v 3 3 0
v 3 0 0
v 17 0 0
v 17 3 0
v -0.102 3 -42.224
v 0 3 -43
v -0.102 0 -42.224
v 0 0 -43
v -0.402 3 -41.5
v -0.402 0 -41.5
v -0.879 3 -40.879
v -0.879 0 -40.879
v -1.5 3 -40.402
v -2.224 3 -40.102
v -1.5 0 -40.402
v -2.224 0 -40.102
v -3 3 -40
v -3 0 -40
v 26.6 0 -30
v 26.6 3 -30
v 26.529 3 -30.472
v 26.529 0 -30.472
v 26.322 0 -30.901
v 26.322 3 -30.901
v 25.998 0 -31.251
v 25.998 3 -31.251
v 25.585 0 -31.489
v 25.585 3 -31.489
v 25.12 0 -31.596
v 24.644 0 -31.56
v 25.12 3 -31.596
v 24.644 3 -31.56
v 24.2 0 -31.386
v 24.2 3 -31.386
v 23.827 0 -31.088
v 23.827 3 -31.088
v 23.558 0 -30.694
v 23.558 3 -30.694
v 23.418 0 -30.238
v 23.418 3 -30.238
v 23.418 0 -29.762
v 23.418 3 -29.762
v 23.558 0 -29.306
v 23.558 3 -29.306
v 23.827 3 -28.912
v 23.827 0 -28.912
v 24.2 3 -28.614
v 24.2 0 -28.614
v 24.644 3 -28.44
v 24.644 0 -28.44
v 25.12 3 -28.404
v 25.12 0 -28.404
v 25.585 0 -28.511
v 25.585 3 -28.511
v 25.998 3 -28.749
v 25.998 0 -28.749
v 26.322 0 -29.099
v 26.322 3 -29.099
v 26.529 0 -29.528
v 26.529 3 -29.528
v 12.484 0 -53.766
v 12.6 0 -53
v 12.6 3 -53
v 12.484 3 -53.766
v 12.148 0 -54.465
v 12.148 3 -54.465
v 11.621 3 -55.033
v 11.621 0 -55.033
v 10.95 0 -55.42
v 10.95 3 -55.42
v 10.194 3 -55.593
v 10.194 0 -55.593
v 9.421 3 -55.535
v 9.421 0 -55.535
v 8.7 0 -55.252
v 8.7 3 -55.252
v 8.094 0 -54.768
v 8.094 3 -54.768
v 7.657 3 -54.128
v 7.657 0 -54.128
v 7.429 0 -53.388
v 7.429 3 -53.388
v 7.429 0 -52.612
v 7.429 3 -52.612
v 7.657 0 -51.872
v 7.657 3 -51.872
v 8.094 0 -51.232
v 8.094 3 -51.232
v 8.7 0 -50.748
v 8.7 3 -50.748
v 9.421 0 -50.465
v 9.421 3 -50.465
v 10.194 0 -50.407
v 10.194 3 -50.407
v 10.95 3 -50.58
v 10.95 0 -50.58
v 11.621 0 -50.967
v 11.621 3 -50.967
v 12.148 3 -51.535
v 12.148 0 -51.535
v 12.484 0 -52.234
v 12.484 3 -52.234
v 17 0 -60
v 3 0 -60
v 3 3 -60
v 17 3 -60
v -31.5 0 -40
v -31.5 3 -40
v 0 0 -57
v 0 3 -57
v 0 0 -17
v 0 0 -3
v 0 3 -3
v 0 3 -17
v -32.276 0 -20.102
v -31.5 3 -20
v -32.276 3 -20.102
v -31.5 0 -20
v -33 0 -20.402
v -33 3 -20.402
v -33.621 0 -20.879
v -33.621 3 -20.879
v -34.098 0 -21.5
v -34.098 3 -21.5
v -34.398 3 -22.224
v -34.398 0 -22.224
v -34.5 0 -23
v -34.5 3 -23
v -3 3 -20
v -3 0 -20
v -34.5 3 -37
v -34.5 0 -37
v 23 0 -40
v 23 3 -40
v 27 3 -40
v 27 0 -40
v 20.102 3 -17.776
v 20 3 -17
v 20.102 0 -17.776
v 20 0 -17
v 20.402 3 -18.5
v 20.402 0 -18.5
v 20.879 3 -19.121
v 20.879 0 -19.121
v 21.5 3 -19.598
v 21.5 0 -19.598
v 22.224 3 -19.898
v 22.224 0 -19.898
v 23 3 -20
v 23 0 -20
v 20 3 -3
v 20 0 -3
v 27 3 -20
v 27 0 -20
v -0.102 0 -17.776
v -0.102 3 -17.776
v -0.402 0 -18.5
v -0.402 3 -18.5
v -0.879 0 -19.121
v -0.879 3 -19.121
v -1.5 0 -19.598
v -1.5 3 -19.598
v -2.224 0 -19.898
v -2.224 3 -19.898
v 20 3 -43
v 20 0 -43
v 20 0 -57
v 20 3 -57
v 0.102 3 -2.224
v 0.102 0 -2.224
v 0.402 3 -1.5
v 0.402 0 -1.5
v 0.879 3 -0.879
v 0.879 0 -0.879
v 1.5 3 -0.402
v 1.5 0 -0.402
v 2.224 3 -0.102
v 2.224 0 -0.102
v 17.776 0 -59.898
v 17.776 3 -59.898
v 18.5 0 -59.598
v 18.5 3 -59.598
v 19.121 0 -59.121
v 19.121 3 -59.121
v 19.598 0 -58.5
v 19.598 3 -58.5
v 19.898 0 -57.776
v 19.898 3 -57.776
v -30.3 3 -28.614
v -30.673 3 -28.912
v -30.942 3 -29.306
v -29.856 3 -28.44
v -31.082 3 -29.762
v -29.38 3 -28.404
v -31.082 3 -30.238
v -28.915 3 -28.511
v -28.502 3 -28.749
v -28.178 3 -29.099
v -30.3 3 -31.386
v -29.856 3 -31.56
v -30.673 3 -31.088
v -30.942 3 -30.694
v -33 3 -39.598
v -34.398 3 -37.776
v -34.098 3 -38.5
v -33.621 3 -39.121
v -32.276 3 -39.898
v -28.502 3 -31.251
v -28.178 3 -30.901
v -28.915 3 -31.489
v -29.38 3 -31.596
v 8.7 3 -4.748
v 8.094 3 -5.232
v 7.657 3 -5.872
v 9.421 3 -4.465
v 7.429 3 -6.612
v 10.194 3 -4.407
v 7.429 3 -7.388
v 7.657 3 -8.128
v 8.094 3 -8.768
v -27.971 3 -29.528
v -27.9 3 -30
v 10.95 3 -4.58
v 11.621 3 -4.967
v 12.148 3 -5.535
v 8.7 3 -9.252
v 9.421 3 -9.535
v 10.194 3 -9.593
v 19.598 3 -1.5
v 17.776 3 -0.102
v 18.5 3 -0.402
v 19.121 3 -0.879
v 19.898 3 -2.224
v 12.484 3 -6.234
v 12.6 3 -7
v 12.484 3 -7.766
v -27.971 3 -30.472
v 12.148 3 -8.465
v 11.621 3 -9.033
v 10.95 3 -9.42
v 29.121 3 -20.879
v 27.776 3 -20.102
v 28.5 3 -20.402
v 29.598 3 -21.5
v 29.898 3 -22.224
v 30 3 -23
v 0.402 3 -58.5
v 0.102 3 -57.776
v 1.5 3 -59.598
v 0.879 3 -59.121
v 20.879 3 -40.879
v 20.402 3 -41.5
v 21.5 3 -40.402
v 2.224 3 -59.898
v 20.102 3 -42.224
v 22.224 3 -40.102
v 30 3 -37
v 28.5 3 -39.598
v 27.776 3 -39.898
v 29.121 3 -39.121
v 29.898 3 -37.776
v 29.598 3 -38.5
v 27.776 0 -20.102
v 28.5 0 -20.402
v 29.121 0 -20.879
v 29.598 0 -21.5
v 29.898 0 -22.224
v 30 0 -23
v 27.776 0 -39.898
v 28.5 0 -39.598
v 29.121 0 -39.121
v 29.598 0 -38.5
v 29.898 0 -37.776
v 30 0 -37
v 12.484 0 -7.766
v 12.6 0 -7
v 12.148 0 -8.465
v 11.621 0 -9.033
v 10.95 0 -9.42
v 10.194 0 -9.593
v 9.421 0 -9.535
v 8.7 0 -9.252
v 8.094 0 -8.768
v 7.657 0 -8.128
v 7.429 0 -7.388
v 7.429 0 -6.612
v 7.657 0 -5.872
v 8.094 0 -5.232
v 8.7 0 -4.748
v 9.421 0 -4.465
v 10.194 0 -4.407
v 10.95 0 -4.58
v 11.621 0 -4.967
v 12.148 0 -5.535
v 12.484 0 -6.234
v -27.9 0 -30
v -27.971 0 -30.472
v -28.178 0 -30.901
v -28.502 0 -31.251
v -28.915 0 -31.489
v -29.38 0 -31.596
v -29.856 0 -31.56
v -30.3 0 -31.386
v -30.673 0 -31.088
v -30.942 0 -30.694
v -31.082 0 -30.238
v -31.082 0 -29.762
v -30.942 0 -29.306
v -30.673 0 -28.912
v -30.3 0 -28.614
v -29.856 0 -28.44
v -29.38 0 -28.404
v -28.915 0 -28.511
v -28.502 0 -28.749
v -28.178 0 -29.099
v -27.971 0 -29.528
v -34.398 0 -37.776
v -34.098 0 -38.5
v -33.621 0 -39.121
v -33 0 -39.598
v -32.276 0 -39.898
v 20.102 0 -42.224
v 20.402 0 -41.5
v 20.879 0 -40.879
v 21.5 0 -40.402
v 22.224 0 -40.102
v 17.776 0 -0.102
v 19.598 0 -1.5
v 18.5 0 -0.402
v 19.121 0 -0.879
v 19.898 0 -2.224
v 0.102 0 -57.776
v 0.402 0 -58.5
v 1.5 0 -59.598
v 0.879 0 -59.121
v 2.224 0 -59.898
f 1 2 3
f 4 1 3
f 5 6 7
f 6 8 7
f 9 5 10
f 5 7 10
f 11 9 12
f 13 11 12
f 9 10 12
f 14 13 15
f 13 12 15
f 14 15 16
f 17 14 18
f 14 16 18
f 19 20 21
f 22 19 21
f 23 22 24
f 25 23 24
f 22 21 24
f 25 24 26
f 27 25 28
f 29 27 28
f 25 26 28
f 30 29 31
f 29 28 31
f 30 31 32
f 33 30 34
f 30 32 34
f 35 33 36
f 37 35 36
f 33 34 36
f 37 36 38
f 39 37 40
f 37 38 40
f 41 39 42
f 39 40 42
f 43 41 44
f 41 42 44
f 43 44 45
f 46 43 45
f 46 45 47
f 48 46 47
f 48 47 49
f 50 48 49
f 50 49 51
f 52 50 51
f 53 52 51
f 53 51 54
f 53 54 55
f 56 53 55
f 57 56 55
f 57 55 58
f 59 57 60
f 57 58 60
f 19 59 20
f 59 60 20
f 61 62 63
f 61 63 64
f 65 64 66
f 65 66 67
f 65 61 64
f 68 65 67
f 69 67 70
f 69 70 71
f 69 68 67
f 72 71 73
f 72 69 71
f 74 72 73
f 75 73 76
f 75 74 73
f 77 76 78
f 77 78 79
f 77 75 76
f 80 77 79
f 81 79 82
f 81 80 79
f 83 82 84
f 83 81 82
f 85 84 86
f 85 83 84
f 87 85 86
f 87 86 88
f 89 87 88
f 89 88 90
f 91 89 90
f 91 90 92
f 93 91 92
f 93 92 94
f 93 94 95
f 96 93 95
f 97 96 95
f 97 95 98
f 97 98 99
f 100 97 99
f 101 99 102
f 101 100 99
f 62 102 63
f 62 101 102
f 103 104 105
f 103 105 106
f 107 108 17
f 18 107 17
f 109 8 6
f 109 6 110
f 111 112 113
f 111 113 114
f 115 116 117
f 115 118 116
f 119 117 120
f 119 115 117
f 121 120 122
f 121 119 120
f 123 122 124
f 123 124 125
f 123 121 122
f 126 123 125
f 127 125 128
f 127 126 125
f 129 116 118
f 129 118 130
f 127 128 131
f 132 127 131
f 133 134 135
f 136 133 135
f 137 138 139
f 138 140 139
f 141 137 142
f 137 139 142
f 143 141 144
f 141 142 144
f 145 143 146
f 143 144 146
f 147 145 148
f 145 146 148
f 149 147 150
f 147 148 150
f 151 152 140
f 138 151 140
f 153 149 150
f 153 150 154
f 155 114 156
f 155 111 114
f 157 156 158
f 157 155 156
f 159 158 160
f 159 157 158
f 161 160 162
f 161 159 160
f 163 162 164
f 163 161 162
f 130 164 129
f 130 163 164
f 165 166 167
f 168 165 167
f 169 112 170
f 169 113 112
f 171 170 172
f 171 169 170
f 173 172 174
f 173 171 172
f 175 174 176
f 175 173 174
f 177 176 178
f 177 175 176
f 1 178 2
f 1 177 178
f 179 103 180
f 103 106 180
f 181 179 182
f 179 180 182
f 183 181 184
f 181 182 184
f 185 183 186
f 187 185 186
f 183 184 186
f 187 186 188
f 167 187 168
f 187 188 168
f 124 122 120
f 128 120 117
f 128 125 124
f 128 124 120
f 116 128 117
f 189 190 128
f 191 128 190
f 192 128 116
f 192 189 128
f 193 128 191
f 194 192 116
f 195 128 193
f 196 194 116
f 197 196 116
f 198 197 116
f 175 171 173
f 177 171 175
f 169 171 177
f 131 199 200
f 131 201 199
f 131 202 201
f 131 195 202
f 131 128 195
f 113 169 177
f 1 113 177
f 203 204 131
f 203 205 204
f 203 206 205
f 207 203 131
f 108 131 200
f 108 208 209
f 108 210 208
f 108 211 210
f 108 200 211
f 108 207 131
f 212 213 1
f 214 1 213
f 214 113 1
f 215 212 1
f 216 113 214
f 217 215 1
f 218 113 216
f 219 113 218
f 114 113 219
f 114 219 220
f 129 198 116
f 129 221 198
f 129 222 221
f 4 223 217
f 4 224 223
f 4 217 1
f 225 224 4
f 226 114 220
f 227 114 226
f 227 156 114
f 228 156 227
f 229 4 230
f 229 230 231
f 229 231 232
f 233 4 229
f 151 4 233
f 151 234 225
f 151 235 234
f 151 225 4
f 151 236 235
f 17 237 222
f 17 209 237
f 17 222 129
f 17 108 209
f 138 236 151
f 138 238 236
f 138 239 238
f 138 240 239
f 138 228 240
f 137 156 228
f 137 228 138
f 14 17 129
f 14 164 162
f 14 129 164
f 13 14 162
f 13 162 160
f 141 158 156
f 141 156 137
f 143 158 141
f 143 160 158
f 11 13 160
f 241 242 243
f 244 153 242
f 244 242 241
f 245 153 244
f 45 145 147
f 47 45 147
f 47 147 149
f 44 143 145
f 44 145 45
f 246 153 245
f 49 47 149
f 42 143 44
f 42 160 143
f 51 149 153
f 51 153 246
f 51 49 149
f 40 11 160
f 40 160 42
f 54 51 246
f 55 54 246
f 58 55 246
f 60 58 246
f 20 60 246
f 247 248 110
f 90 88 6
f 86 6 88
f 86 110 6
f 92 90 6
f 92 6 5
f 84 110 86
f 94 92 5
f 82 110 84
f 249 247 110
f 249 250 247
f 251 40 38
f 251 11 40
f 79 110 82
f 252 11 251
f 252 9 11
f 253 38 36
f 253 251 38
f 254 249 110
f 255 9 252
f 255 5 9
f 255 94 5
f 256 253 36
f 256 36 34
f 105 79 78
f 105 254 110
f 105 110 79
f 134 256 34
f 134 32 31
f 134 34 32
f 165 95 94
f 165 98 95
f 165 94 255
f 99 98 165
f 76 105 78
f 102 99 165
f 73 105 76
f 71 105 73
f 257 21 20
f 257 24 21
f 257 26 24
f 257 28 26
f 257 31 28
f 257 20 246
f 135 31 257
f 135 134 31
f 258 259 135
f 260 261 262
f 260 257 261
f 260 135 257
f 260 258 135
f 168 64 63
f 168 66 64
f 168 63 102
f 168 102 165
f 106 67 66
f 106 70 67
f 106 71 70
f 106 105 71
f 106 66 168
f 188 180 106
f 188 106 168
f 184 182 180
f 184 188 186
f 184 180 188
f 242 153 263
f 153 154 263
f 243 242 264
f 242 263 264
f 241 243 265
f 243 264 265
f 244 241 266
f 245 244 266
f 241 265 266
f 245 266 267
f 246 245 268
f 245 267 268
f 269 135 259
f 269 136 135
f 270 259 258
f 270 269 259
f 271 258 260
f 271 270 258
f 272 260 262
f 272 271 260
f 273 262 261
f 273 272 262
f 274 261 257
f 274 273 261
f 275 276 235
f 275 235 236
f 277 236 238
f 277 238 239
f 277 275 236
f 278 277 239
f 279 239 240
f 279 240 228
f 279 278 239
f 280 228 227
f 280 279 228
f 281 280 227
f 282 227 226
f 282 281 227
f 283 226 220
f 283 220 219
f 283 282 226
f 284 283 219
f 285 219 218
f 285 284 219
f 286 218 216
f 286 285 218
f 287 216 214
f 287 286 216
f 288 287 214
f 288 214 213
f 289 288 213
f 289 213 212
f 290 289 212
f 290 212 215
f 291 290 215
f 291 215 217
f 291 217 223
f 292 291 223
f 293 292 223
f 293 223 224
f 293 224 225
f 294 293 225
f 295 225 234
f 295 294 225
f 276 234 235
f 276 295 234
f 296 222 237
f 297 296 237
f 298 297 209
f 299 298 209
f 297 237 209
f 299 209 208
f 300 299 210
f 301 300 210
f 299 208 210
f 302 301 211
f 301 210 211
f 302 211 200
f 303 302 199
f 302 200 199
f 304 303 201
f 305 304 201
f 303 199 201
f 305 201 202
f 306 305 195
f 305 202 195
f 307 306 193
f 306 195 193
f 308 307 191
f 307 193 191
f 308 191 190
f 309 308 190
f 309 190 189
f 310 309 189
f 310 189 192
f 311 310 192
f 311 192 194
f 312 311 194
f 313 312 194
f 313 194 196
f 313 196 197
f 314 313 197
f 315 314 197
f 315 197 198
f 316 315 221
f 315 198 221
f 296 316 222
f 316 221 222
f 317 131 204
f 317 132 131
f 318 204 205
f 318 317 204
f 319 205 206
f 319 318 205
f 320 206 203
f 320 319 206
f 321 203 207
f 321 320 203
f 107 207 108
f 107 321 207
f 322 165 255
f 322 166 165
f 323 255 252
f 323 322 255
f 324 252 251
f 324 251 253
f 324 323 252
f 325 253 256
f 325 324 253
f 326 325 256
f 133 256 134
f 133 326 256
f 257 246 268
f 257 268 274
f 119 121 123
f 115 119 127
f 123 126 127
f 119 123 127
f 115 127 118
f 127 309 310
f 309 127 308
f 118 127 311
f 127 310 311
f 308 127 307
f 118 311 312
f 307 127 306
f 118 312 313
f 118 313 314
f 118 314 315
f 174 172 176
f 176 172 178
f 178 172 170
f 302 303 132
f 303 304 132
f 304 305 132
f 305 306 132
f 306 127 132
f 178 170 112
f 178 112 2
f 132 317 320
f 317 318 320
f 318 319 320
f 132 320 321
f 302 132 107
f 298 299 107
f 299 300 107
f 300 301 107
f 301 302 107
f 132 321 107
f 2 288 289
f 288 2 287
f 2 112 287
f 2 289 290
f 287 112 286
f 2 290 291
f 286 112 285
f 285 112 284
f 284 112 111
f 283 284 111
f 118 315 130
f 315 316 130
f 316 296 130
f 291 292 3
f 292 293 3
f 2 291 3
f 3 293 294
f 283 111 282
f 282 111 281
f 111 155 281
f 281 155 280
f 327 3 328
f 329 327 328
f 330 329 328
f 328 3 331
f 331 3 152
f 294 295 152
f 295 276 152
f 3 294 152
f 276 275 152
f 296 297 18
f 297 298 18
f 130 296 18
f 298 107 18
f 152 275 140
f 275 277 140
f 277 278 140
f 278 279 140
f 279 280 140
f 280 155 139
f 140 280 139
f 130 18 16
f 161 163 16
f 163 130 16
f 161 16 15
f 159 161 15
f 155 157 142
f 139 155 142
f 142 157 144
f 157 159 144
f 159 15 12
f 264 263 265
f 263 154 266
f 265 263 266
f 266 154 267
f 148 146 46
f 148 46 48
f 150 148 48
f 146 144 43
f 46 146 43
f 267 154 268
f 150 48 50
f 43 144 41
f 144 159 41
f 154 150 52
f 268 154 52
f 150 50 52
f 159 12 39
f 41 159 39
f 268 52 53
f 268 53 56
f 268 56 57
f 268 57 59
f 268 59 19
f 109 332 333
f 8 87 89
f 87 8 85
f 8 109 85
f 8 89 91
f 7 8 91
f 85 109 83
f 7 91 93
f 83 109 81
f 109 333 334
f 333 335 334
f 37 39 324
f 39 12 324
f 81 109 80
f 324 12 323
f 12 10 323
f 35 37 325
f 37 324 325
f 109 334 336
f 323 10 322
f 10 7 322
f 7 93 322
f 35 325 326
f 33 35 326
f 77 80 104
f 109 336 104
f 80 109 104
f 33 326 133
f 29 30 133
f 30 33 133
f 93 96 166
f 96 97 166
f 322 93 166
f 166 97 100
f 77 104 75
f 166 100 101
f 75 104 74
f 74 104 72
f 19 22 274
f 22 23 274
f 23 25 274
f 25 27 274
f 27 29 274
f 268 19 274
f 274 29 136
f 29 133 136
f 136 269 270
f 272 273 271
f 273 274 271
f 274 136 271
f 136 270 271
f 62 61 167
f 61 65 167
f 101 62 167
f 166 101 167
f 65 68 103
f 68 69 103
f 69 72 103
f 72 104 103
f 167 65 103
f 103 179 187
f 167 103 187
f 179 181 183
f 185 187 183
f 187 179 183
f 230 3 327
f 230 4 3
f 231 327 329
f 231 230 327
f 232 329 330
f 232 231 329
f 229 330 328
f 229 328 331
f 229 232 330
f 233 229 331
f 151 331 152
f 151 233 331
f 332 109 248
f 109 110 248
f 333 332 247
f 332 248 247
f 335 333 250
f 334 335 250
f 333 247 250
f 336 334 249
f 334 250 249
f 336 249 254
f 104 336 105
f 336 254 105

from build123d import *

# Parameters (mm, degrees)
SKETCH_1_W      = 20
SKETCH_1_H      = 60
SKETCH_1_R      = 2.6
EXTRUDE_1_DEPTH = 3
SKETCH_2_W      = 34.5
SKETCH_2_H      = 20
SKETCH_2_R      = 1.6
SKETCH_2_W_2    = 10
EXTRUDE_2_DEPTH = 3
FILLET_1_R      = 3


with BuildPart() as part:
    # 草图1 → 凸台-拉伸1 (new body)
    with BuildSketch(Plane(origin=(0, 0, 0), x_dir=(1, 0, 0), z_dir=(0, 1, 0))):
        with Locations((10, 30)):
            Rectangle(SKETCH_1_W, SKETCH_1_H)
        with Locations((10, 7)):
            Circle(SKETCH_1_R, mode=Mode.SUBTRACT)
        with Locations((10, 53)):
            Circle(SKETCH_1_R, mode=Mode.SUBTRACT)
    extrude(amount=EXTRUDE_1_DEPTH)

    # 草图2 → 凸台-拉伸2 (add)
    with BuildSketch(Plane(origin=(0, 3, 0), x_dir=(1, 0, 0), z_dir=(0, 1, 0))):
        with Locations((-17.25, 30)):
            Rectangle(SKETCH_2_W, SKETCH_2_H)
        with Locations((-29.5, 30)):
            Circle(SKETCH_2_R, mode=Mode.SUBTRACT)
        with Locations((25, 30)):
            Rectangle(SKETCH_2_W_2, SKETCH_2_H)
        with Locations((25, 30)):
            Circle(SKETCH_2_R, mode=Mode.SUBTRACT)
    extrude(amount=-EXTRUDE_2_DEPTH)

    # 圆角1
    fillet_1_edges = [part.edges().sort_by_distance(p)[0] for p in [
        (0, 1.5, -40),
        (0, 1.5, -20),
        (-34.5, 1.5, -20),
        (-34.5, 1.5, -40),
        (20, 1.5, -20),
        (20, 1.5, -40),
        (30, 1.5, -40),
        (30, 1.5, -20),
        (0, 1.5, -60),
        (20, 1.5, -60),
        (20, 1.5, 0),
        (0, 1.5, 0),
    ]]
    fillet(fillet_1_edges, radius=FILLET_1_R)


solid = part.part
